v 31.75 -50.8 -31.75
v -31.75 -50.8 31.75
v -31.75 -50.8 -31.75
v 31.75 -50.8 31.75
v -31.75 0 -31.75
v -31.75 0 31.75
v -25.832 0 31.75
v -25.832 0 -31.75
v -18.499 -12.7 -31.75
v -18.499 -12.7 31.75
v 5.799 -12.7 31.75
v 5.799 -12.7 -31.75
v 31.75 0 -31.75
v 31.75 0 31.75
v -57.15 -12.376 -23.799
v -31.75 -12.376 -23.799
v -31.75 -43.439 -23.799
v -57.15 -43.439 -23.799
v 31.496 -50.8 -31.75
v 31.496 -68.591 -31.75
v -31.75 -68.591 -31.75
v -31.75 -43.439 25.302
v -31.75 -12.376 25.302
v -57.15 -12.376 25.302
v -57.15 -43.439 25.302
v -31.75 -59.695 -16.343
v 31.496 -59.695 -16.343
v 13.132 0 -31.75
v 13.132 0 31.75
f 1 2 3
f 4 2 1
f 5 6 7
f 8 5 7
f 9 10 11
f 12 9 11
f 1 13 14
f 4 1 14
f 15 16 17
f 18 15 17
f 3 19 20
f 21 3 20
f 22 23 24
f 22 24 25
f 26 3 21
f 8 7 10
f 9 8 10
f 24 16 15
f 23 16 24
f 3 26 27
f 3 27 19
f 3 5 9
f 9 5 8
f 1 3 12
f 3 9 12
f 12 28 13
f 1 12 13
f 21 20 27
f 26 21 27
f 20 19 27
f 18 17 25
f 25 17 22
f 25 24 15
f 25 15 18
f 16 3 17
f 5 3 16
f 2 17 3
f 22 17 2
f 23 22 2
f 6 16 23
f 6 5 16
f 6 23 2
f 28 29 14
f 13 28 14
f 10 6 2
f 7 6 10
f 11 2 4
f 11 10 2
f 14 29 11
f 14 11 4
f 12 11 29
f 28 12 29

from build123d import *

# Parameters (mm, degrees)
F0_W     = 63.5
F0_H     = 63.5
F1_DEPTH = 50.8
F3_DEPTH = 82.042
F6_DEPTH = 63.246
F7_W     = 31.063381
F7_H     = 49.100179
F8_DEPTH = 25.4


with BuildPart() as f1:
    # F0 (on Front) → F1 (new body)
    with BuildSketch(Plane.XZ):
        Rectangle(F0_W, F0_H)
    extrude(amount=F1_DEPTH)

    # F2 (on face) → F3 (cut)
    with BuildSketch(Plane.XY.offset(31.75)):
        Polygon((13.1318, 0), (-25.8318, 0), (-18.499452, -12.7), (5.799452, -12.7), align=None)
    extrude(amount=-F3_DEPTH, mode=Mode.SUBTRACT)

    # F7 (on face) → F8 (join)
    with BuildSketch(Plane(origin=(-31.75, 0, 0), x_dir=(0, -1, 0), z_dir=(-1, 0, 0))):
        with Locations((27.907608, 0.751532)):
            Rectangle(F7_W, F7_H)
    extrude(amount=F8_DEPTH)


with BuildPart() as f6:
    # F5 (on face) → F6 (new body)
    with BuildSketch(Plane(origin=(-31.75, 0, 0), x_dir=(0, -1, 0), z_dir=(-1, 0, 0))):
        Polygon((59.695451, -16.342627), (50.8, -31.75), (68.590902, -31.75), align=None)
    extrude(amount=-F6_DEPTH)


solid = Compound([f1.part, f6.part])
